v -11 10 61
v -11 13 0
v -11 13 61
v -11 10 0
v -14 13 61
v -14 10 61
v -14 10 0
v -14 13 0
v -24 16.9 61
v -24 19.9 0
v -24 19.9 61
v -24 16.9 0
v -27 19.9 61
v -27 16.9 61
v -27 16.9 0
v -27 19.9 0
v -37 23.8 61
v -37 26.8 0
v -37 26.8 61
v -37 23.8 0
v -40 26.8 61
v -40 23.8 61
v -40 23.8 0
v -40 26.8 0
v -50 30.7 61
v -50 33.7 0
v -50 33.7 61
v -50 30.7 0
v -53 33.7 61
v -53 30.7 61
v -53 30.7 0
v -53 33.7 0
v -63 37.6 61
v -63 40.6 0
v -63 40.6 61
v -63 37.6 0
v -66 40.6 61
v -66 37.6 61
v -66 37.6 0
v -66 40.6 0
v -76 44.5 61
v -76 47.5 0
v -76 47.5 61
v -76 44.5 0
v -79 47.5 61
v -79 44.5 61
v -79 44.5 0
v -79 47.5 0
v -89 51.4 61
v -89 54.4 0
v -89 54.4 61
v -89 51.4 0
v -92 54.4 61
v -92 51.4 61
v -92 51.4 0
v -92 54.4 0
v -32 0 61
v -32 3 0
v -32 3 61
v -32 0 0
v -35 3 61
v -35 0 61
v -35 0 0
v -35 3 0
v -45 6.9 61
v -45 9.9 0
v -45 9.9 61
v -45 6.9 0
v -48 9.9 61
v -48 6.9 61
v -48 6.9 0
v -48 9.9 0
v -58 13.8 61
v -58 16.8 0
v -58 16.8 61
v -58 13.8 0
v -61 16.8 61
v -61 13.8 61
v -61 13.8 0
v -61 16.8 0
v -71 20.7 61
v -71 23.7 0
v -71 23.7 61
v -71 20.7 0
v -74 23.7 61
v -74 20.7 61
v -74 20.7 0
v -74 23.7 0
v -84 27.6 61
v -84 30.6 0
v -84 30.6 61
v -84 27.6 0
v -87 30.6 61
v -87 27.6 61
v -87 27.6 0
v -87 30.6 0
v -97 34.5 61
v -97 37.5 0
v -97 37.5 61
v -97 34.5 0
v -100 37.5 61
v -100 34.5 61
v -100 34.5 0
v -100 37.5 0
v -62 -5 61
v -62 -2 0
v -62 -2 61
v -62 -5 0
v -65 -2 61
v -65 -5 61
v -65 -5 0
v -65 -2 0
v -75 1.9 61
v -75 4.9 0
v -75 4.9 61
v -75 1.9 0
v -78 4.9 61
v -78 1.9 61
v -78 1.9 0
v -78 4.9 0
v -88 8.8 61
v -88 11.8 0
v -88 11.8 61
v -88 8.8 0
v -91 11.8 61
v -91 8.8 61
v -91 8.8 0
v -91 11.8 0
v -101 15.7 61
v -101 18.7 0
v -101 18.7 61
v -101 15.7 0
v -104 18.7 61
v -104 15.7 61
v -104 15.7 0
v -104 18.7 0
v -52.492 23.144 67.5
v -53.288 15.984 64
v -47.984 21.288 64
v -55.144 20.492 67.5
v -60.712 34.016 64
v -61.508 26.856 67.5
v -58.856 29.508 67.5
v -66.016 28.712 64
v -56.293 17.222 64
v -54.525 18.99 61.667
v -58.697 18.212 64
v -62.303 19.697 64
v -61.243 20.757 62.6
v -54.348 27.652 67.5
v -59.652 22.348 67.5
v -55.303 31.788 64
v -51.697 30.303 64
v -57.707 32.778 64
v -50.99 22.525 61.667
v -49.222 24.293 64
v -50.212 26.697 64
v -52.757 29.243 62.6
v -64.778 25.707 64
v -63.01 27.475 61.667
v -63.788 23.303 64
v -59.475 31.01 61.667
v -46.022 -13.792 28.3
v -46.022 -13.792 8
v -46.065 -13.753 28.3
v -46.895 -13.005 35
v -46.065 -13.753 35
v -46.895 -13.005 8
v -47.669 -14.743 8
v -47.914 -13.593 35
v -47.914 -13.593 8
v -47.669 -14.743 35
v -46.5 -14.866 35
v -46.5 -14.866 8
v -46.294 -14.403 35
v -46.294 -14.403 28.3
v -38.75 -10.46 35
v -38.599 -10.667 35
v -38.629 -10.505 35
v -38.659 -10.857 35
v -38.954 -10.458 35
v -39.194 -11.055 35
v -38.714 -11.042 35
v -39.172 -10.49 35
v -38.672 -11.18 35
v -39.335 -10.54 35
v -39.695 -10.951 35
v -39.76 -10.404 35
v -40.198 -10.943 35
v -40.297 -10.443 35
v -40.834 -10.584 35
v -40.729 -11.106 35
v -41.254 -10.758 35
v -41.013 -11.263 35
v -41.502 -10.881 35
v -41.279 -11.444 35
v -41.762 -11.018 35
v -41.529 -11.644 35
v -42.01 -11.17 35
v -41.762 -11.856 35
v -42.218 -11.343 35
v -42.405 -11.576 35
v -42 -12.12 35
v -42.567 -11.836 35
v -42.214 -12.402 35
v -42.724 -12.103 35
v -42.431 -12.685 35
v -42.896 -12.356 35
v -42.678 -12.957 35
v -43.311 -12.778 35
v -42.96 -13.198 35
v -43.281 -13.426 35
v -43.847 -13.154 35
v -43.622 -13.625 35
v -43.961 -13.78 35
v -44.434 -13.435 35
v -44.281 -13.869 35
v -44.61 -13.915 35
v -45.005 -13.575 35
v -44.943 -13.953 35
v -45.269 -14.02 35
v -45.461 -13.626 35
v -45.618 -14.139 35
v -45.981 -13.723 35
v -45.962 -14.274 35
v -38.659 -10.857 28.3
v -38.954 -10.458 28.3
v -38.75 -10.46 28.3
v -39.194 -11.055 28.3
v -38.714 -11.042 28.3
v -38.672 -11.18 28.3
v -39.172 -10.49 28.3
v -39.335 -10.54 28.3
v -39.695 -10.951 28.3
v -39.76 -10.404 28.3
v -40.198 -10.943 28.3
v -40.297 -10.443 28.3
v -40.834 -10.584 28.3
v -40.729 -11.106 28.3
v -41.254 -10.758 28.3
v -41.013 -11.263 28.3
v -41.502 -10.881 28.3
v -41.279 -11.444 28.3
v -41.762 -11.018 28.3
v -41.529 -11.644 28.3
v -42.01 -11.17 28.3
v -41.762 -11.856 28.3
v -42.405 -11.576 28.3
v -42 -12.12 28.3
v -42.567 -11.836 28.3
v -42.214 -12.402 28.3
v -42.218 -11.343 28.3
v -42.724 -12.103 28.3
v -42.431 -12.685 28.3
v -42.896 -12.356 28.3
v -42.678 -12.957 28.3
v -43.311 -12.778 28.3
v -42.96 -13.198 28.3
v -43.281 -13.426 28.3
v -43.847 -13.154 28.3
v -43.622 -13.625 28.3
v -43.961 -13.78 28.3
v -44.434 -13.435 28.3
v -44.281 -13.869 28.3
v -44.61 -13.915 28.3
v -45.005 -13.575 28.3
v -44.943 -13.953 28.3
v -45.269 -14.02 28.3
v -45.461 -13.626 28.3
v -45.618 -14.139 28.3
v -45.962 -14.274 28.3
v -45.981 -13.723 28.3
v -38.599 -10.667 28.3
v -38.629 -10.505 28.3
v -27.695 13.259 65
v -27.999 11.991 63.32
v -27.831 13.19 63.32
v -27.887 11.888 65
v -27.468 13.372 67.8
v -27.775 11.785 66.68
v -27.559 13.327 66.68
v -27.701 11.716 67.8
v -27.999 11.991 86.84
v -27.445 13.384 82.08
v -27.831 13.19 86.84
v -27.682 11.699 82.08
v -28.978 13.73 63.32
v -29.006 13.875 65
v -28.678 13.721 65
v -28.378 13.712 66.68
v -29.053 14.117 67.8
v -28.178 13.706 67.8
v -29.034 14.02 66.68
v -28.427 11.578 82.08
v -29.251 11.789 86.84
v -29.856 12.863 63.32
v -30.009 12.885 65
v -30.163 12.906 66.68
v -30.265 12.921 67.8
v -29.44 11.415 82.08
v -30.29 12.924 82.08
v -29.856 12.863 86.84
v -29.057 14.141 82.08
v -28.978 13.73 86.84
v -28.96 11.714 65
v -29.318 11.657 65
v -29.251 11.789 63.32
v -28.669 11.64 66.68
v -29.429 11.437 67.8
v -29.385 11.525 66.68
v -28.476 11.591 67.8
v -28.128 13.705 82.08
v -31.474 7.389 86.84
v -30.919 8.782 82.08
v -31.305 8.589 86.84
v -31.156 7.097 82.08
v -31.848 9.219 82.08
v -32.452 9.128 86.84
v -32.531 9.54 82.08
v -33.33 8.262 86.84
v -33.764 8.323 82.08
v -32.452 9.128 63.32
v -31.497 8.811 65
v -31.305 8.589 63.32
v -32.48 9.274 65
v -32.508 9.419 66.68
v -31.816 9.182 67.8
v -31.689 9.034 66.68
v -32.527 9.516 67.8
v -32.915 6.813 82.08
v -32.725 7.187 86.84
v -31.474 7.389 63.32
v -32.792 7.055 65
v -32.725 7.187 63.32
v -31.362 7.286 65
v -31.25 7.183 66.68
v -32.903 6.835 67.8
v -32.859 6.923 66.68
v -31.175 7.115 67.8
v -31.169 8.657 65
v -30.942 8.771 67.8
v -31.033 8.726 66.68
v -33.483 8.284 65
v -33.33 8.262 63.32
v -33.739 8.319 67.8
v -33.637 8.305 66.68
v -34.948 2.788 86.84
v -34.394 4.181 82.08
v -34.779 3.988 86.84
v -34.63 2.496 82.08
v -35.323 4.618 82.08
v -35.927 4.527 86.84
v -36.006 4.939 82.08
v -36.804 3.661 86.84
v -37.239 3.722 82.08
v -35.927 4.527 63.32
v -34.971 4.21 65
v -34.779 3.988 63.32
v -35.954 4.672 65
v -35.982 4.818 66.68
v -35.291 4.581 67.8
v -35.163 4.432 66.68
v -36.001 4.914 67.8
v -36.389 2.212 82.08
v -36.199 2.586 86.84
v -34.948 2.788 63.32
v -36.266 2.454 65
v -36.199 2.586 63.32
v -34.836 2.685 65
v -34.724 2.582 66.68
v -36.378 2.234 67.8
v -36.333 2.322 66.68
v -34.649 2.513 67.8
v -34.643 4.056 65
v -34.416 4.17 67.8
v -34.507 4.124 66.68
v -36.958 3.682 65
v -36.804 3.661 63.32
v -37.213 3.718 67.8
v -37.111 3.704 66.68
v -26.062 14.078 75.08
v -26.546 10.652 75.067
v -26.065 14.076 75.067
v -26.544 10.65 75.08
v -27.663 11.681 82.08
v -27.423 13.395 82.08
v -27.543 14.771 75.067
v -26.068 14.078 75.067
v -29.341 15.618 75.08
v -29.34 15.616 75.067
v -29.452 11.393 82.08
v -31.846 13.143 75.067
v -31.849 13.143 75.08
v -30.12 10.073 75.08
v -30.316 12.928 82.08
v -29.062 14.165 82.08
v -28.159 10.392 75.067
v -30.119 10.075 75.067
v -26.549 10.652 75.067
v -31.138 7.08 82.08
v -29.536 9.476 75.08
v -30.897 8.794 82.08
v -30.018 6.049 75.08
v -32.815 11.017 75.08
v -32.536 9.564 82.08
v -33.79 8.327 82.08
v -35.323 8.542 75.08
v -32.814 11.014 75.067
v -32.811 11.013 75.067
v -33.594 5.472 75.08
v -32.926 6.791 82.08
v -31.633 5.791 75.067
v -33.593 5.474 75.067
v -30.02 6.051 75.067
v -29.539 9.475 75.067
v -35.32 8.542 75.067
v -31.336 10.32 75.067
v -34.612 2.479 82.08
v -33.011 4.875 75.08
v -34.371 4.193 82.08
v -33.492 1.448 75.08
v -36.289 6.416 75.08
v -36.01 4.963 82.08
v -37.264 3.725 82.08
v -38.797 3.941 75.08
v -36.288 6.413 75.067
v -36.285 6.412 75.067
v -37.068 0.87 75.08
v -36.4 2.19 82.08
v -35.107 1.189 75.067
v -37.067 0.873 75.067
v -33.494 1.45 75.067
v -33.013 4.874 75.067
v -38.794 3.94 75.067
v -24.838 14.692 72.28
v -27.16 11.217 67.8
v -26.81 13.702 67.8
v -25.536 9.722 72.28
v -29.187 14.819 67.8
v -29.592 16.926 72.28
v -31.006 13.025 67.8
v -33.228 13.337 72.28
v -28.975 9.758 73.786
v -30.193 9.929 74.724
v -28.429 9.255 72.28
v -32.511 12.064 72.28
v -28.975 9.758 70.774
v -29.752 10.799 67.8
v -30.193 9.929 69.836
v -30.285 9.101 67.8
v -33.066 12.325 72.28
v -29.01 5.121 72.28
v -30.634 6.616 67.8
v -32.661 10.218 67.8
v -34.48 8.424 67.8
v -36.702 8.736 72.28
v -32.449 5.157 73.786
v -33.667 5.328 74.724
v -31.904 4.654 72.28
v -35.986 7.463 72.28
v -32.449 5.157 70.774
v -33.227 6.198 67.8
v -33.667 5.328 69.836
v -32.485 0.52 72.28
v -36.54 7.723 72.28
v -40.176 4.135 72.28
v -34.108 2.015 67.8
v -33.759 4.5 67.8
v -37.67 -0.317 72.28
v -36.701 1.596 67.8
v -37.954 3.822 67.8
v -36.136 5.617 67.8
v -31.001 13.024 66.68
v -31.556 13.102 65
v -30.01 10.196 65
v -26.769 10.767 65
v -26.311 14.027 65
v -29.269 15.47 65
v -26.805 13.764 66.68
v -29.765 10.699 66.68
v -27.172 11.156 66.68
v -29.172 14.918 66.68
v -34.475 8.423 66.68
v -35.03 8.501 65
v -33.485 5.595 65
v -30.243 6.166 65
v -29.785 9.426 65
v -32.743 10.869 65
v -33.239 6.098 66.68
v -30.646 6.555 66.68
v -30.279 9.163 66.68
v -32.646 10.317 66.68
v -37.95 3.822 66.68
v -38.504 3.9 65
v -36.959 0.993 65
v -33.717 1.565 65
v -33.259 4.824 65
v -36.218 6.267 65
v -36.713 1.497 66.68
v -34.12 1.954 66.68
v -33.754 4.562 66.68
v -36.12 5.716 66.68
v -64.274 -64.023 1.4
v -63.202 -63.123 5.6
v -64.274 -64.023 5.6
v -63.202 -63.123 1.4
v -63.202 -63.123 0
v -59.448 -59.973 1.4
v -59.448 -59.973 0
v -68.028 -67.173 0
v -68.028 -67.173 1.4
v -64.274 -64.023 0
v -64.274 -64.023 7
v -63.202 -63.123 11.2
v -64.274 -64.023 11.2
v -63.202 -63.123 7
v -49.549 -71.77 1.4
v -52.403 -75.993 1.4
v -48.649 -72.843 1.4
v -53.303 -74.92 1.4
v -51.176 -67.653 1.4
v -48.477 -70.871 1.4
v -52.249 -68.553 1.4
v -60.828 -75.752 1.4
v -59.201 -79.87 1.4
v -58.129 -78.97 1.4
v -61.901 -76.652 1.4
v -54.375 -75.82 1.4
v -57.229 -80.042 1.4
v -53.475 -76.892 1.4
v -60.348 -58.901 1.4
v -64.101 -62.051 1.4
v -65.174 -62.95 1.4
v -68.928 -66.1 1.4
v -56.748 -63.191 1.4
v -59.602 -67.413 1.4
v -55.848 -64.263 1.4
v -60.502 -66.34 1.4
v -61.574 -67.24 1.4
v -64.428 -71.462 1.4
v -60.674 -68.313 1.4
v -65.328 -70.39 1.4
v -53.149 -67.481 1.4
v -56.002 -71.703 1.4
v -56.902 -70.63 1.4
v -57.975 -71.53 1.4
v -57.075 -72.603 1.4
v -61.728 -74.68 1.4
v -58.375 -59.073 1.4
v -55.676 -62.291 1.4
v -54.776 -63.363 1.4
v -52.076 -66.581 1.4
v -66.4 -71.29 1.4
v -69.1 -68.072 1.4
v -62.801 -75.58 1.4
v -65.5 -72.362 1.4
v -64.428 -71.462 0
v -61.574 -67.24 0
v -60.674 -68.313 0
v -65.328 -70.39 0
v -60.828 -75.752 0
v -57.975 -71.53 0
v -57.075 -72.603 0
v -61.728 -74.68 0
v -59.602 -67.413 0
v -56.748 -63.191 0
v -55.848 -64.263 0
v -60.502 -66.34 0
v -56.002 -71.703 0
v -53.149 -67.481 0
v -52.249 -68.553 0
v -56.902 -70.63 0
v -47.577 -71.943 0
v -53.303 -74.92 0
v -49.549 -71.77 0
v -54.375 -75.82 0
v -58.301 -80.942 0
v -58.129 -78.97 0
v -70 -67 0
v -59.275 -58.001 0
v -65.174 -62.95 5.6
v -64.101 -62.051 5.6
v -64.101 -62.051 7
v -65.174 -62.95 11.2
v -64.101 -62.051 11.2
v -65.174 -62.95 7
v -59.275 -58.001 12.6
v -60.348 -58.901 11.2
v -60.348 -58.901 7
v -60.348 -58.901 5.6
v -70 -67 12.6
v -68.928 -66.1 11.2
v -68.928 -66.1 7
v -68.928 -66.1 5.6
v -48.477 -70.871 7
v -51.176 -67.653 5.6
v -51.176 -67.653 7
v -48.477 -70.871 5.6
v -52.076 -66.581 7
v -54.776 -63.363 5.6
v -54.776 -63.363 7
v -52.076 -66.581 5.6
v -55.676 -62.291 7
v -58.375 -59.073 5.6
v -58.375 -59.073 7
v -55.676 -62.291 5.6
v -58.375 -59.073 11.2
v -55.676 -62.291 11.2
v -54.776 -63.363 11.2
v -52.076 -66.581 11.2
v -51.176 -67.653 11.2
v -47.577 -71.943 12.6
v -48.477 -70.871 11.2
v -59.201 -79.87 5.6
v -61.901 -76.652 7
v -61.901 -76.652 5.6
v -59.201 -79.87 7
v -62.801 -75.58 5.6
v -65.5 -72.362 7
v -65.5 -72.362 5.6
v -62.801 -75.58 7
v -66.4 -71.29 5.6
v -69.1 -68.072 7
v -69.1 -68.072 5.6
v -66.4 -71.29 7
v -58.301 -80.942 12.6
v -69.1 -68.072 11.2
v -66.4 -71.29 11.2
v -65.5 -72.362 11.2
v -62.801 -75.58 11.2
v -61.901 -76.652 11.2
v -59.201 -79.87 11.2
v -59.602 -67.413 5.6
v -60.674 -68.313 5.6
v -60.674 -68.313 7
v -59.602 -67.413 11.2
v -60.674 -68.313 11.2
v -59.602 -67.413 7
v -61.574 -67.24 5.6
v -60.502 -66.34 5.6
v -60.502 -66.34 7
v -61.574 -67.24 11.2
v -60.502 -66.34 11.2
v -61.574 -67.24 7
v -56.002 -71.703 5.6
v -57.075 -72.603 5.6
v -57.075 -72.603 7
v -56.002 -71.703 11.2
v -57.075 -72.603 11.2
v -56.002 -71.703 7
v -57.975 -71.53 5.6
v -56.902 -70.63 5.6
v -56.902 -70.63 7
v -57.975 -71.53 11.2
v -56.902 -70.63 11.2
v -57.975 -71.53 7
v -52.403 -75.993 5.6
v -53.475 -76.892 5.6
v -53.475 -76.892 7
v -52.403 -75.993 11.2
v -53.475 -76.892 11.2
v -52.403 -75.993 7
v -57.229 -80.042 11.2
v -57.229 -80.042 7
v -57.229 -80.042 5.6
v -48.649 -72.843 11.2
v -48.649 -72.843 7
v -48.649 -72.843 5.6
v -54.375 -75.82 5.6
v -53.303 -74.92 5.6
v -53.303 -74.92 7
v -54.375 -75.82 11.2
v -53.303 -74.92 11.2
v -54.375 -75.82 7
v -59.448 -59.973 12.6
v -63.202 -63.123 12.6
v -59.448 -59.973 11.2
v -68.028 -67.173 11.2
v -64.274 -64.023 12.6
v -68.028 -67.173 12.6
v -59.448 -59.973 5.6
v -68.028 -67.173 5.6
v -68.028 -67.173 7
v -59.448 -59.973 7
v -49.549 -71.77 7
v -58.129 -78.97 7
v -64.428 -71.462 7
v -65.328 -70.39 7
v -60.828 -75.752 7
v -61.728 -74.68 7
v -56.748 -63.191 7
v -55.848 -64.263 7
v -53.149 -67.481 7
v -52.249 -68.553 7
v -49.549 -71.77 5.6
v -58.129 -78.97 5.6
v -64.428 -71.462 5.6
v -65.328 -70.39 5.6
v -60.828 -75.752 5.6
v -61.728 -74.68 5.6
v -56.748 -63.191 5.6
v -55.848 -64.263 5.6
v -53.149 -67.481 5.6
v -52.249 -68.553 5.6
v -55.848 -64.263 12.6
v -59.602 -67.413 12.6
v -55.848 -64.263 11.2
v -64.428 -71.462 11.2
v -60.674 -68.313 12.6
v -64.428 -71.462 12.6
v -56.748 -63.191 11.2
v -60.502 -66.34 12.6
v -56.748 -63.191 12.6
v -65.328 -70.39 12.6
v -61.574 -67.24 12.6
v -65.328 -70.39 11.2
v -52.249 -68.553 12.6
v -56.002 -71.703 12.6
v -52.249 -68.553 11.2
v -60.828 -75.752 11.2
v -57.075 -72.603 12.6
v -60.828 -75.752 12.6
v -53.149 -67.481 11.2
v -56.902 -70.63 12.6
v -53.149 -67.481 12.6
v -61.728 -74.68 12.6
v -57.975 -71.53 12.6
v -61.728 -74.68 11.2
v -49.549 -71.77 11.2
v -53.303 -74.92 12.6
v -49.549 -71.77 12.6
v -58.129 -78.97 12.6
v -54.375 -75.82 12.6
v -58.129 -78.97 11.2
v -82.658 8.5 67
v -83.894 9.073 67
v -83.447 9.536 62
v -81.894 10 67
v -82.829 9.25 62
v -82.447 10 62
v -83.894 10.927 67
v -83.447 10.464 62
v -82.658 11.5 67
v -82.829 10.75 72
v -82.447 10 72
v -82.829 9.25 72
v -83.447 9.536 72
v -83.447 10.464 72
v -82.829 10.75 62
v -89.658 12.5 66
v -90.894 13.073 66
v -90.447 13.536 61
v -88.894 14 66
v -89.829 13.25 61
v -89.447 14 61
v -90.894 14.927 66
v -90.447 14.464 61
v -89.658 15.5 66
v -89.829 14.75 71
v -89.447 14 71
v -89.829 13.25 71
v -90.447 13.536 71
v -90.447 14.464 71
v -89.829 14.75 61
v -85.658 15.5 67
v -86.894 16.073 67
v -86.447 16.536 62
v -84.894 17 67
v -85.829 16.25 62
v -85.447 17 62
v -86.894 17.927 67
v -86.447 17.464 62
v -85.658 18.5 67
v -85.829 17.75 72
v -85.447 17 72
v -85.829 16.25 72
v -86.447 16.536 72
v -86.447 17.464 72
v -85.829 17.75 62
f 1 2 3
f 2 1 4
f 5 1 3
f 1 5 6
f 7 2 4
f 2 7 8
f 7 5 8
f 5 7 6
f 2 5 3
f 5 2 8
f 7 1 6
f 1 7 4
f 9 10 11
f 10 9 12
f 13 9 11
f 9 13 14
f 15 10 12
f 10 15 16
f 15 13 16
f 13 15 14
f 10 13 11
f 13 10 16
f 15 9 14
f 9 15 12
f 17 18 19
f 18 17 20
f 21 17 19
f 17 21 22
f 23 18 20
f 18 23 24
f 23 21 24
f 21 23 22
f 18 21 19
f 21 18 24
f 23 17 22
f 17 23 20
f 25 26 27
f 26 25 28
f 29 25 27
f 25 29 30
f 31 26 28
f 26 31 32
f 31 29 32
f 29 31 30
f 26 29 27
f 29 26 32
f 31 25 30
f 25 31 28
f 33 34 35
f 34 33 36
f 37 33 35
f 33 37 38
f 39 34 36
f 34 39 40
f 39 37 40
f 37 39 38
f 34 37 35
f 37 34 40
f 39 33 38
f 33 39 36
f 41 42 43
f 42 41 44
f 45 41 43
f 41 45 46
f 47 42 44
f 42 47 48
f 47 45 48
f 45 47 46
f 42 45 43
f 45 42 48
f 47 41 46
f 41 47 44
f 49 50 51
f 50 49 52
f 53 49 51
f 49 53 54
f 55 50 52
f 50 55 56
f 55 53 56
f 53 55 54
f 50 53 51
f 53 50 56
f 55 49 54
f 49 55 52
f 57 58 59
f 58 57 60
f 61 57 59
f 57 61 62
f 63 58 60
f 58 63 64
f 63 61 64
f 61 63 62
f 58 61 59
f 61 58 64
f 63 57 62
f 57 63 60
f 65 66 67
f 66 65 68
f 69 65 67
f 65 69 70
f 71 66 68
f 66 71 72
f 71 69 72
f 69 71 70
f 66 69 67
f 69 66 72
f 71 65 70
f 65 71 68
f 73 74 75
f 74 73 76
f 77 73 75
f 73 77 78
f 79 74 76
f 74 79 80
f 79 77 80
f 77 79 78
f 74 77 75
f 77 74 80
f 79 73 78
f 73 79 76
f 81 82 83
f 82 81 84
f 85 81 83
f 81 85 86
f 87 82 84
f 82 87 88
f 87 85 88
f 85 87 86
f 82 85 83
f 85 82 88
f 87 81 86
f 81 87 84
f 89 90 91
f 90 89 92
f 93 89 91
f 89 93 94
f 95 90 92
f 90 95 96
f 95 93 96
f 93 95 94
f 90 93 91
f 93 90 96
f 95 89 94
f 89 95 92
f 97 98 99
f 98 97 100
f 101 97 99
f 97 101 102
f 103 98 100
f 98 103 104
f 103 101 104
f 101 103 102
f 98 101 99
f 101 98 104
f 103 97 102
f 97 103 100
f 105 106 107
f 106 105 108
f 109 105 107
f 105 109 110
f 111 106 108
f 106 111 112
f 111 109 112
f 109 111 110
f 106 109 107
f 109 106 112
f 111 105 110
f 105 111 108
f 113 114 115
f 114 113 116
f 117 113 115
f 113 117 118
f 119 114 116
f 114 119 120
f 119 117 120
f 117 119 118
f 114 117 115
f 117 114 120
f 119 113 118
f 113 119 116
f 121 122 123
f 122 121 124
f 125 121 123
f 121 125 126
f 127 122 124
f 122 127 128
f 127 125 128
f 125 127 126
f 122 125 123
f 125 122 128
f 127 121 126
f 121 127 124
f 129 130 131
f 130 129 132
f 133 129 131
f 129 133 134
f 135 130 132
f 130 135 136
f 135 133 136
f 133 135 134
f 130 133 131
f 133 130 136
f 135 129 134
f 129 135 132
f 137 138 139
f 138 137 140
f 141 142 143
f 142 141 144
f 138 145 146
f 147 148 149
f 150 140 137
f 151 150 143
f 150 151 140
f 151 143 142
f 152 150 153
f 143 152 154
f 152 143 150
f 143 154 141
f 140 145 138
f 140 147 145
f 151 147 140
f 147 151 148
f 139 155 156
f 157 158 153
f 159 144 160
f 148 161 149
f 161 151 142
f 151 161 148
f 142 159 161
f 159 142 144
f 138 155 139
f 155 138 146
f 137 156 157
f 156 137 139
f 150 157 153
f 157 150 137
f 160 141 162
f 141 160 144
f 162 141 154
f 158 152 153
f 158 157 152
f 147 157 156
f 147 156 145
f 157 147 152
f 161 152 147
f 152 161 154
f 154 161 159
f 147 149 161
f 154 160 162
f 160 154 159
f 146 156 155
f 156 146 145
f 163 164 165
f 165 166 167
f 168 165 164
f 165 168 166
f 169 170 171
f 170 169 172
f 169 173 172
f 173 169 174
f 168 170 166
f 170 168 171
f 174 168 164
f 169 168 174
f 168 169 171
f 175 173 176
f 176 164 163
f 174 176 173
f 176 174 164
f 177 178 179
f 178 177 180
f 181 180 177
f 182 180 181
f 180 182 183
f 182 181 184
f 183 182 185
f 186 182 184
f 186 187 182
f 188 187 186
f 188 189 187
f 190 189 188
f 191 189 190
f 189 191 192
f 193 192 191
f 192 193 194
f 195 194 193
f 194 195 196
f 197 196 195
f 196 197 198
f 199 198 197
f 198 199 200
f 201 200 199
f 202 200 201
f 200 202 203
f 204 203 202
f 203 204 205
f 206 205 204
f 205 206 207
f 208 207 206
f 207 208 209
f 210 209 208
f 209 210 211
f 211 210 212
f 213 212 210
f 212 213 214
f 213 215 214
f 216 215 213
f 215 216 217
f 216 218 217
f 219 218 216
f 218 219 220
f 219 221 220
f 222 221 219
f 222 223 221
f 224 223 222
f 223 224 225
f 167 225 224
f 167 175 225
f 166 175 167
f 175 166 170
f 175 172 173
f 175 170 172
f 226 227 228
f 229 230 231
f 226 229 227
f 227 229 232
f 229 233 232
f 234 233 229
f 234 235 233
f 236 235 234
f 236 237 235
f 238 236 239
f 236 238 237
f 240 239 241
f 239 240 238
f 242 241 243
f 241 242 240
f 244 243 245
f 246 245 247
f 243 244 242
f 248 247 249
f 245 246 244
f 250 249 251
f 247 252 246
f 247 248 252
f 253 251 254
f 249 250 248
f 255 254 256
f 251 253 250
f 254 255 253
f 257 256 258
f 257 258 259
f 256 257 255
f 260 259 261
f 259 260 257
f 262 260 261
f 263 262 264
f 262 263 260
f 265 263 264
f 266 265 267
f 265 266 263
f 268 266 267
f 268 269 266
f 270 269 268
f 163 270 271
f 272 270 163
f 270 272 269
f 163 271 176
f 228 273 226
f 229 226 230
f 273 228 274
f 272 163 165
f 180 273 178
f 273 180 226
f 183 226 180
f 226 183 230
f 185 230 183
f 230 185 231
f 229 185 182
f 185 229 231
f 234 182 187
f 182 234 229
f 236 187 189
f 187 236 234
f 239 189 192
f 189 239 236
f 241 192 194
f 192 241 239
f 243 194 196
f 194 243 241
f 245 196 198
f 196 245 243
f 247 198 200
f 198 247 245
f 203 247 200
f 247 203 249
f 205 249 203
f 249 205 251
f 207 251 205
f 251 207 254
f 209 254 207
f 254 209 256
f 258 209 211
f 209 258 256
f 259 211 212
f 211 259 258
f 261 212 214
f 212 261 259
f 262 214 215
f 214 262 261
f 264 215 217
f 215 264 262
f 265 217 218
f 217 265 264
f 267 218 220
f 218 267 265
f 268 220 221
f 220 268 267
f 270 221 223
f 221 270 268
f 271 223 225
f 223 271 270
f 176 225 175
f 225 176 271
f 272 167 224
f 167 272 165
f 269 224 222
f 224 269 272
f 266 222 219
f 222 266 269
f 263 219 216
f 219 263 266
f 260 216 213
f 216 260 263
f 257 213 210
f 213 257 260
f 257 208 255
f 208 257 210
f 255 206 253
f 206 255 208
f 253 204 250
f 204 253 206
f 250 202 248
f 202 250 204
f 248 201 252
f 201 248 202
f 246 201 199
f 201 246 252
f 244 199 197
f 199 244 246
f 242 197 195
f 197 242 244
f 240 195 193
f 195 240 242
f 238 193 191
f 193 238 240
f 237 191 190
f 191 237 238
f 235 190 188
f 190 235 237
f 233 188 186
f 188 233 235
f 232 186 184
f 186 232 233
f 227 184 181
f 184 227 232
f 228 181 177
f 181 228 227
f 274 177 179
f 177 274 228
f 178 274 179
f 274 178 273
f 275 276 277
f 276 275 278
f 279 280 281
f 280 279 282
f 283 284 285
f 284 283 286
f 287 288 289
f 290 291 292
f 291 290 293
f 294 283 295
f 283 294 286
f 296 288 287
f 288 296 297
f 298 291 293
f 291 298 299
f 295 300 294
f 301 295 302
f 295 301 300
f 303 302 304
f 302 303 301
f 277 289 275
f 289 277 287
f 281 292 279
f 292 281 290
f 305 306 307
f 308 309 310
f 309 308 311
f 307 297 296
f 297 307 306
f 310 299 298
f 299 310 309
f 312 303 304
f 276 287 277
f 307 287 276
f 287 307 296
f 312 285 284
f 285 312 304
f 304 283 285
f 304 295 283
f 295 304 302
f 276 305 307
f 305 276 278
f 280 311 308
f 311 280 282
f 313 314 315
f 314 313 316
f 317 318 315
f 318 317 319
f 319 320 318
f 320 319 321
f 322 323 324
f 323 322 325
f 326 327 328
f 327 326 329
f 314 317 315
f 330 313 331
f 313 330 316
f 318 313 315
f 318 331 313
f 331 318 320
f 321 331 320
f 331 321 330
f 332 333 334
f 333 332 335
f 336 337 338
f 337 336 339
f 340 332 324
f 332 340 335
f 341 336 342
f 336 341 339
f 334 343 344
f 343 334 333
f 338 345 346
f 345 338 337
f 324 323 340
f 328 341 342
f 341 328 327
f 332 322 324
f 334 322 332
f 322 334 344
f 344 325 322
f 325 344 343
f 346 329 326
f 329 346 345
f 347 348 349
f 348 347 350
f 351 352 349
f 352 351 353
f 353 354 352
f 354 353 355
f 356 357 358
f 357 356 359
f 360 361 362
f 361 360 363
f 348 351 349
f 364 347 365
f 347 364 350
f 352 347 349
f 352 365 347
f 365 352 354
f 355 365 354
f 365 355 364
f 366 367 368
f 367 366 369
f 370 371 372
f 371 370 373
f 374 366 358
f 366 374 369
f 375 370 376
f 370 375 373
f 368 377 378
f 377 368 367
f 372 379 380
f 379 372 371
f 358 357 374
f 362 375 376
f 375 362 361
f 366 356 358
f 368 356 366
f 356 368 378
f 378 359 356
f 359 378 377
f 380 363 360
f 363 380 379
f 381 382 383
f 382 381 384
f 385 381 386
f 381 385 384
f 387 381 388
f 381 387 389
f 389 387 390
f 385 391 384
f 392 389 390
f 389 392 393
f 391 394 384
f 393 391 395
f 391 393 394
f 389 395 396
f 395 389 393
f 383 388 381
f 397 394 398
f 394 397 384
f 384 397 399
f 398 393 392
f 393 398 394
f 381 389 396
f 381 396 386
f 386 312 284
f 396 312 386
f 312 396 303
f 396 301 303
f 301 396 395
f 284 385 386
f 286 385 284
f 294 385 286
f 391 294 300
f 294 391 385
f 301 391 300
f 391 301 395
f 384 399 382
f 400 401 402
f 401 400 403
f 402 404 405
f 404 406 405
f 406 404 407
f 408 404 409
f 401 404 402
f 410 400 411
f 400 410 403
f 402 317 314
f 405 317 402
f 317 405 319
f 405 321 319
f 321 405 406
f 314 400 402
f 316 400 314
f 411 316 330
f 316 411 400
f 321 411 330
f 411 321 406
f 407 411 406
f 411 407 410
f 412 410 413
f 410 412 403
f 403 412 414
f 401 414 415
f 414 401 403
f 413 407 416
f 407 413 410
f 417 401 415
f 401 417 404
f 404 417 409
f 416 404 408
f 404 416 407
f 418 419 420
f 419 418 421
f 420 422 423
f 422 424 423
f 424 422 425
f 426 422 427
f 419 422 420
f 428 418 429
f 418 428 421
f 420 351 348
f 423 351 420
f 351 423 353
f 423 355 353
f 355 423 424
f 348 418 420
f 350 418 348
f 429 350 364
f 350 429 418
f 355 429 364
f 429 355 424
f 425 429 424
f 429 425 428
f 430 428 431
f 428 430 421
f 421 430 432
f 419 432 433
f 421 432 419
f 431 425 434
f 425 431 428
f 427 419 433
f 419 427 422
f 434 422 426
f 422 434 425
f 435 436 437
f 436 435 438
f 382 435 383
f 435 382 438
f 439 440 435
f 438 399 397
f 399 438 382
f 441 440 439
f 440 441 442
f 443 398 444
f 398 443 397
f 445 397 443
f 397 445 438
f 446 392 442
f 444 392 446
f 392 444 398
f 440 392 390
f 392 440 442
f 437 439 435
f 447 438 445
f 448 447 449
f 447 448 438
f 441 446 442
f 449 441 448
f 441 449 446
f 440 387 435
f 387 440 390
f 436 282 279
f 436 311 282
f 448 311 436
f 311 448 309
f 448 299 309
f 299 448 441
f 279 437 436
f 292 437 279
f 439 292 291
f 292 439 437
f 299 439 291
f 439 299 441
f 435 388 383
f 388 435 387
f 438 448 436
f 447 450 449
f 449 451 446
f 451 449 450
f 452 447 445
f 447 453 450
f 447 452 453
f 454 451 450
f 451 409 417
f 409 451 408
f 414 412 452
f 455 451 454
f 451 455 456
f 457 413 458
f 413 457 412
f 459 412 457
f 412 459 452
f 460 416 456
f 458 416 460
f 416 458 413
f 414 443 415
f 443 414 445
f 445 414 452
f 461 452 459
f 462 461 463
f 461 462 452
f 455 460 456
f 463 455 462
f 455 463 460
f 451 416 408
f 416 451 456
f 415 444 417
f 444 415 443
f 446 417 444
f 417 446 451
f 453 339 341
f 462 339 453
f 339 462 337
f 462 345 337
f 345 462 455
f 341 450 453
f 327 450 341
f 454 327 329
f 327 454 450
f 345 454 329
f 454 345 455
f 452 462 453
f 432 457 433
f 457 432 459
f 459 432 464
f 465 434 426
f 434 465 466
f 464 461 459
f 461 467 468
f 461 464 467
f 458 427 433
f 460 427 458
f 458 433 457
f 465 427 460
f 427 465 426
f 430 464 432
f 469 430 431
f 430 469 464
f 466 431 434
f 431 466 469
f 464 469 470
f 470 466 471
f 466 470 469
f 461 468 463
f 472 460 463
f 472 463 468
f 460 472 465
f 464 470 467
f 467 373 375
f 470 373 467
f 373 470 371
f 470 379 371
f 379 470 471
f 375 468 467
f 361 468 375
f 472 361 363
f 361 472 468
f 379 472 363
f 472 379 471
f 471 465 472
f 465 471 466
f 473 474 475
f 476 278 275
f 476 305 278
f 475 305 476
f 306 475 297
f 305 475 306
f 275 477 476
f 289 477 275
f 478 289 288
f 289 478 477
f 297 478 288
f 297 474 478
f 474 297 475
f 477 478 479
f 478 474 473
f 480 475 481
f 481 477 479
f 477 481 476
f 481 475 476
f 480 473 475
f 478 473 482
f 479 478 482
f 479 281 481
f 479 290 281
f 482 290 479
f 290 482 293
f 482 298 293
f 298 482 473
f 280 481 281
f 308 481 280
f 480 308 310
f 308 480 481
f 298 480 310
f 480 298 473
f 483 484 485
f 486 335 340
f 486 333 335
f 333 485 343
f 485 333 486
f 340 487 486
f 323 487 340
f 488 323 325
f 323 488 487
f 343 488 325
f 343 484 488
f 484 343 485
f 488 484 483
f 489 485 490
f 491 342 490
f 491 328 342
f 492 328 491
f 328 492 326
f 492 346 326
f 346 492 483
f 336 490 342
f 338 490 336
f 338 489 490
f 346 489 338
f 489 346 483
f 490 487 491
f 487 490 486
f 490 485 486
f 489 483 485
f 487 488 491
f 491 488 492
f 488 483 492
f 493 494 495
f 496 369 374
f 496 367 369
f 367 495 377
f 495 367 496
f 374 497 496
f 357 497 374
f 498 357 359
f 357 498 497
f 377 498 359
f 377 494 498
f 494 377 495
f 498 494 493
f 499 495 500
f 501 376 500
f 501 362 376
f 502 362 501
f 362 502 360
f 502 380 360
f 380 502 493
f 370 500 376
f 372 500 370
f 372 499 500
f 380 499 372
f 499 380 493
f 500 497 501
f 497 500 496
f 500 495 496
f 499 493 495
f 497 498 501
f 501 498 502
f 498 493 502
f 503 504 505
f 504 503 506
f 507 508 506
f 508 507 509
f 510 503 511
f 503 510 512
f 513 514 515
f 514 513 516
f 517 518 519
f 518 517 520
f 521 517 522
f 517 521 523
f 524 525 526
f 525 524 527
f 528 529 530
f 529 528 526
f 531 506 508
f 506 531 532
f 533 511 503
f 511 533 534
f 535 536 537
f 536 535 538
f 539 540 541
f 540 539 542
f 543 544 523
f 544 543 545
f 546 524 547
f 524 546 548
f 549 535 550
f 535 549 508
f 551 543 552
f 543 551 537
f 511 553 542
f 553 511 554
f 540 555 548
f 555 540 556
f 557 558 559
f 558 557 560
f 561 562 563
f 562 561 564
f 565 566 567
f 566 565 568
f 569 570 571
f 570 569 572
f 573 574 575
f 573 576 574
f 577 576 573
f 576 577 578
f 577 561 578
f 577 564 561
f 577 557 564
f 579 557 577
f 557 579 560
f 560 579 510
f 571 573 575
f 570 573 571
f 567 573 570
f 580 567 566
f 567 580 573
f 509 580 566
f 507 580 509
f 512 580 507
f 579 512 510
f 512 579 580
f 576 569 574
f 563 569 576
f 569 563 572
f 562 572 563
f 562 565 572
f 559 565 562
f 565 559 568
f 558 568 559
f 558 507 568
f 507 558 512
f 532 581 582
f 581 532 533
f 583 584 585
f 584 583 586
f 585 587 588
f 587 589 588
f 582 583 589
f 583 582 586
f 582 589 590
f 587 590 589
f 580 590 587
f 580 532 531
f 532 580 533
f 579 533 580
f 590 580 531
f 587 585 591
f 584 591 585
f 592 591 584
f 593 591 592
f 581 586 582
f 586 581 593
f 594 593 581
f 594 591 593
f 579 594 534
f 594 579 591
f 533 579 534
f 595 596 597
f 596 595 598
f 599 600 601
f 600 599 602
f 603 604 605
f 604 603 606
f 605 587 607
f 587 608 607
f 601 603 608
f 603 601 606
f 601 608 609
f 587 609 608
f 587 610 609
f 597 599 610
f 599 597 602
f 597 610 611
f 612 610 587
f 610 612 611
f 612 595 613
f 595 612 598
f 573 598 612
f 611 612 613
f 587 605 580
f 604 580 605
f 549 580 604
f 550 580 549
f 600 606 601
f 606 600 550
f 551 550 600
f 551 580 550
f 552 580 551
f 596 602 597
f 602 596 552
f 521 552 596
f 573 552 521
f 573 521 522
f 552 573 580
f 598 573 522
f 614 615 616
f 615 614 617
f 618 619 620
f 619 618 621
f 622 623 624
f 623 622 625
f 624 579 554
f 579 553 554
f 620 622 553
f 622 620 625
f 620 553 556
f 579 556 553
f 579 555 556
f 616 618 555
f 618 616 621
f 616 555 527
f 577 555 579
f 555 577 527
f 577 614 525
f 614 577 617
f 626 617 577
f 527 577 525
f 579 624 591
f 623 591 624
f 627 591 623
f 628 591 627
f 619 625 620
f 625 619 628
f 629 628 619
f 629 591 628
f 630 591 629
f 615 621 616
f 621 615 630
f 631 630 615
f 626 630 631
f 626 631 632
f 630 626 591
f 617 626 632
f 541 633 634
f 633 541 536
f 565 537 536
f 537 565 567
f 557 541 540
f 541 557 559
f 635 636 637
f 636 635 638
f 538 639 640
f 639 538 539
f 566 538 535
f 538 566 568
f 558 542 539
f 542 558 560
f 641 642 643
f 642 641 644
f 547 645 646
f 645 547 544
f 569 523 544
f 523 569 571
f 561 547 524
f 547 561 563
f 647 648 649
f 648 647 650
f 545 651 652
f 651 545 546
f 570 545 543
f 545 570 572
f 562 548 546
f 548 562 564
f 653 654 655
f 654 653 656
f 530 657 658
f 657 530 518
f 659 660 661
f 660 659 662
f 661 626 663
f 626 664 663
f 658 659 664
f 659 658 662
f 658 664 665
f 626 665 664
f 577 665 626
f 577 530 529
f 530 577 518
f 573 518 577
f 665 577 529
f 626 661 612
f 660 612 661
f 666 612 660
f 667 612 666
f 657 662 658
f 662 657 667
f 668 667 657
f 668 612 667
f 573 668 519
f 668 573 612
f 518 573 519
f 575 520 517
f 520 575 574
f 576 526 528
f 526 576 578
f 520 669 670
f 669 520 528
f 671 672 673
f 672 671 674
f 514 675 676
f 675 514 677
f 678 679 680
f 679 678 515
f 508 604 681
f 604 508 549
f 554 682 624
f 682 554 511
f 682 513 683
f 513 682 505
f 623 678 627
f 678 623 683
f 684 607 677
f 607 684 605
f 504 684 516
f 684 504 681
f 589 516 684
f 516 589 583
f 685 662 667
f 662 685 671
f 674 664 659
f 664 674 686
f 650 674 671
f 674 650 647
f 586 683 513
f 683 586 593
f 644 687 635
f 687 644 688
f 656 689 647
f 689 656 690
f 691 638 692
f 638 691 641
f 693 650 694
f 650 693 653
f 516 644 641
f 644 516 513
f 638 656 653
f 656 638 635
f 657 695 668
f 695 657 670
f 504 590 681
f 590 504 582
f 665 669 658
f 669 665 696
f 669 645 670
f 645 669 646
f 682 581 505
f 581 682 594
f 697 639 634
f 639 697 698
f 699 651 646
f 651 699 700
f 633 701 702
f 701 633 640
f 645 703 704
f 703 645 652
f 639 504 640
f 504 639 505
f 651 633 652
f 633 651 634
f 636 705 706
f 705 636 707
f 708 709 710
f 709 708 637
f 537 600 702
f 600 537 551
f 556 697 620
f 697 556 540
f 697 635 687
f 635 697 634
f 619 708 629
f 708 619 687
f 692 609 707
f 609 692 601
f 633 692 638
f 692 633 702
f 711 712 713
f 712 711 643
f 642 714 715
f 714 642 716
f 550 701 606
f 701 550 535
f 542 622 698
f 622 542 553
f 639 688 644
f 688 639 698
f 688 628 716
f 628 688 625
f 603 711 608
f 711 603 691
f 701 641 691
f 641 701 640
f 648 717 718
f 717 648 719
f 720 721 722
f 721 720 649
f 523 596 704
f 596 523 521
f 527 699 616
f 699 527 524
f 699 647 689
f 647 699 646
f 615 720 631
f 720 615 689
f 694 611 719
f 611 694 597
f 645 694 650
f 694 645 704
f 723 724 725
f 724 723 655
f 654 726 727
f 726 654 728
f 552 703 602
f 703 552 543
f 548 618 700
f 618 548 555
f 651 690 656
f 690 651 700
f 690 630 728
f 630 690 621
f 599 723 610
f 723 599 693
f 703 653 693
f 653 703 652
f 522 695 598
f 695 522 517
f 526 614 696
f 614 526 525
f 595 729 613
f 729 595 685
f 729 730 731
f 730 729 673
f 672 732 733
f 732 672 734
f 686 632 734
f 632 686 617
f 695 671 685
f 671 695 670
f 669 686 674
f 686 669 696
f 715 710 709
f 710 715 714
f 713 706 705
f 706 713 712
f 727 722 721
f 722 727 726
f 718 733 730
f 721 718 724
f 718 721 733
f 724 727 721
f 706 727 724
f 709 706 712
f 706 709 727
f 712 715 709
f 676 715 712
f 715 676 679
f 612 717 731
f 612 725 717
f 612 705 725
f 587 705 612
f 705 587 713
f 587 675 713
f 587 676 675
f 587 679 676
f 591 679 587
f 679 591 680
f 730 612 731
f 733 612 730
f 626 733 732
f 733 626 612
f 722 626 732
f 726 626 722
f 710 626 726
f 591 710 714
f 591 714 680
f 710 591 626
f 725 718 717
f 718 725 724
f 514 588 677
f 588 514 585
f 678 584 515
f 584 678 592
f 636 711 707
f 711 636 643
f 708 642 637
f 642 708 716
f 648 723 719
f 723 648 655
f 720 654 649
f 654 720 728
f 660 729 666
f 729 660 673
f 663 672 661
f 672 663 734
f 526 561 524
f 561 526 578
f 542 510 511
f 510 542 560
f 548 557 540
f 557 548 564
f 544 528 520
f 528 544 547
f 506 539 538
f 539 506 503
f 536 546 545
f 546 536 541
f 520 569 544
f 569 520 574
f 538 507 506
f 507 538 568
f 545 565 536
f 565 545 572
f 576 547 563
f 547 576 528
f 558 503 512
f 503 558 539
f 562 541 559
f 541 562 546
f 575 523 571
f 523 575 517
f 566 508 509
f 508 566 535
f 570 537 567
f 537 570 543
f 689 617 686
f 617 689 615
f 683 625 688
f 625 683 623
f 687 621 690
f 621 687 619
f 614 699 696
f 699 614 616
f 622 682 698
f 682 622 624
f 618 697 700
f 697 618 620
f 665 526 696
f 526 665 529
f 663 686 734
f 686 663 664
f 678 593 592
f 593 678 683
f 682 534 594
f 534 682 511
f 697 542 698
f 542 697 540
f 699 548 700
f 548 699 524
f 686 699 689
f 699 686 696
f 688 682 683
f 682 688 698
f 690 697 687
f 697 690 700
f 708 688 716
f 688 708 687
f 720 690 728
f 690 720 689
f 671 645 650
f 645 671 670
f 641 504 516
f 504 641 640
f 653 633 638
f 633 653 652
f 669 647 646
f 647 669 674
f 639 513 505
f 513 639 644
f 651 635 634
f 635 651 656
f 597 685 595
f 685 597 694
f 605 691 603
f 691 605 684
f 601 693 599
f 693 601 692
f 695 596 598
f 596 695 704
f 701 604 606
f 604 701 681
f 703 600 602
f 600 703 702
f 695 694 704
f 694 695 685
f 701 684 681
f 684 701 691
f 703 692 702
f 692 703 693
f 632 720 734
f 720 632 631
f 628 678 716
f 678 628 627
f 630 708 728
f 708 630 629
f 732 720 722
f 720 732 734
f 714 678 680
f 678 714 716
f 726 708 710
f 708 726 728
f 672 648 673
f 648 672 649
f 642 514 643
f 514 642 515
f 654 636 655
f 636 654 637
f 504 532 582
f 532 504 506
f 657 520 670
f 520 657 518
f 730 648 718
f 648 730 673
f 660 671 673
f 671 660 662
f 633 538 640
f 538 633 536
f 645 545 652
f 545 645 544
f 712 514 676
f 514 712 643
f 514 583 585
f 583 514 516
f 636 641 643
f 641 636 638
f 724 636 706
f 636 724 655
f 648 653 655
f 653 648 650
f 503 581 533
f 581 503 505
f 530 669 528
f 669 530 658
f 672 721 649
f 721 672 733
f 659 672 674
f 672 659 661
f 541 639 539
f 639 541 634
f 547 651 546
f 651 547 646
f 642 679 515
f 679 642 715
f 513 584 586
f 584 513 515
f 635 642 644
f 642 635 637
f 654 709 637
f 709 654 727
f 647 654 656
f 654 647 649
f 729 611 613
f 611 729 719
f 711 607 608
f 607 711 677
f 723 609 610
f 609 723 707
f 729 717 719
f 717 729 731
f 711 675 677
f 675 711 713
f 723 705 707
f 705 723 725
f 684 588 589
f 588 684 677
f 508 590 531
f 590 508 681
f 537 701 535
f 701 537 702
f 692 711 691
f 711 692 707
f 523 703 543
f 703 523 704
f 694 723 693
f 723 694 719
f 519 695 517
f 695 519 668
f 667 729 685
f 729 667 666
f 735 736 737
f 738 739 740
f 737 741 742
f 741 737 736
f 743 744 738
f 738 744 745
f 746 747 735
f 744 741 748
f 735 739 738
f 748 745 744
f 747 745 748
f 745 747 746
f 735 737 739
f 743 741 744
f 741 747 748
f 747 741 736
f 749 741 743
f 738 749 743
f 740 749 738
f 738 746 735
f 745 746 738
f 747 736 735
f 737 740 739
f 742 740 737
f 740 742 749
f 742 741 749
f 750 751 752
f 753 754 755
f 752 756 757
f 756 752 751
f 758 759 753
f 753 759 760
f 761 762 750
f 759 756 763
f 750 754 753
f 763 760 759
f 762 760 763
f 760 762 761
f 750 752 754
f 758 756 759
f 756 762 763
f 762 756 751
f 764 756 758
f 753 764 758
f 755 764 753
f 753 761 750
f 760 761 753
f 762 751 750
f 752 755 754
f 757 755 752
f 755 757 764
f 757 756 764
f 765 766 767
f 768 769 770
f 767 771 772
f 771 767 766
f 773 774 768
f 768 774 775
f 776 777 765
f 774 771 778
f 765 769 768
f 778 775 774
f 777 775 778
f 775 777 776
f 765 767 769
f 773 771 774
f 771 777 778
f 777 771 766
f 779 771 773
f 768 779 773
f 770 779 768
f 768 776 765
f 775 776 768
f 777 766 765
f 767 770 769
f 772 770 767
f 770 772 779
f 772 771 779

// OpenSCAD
$fn=6;
for (i=[0:6]){
translate([-14-13*i,10+6.9*i,0])stick();}

$fn=5;
for (i=[0:5]){
translate([-35-13*i,0+6.9*i,0])stick();}

$fn=5;
for (i=[0:3]){
translate([-65-13*i,-5+6.9*i,0])stick();}


module stick(){
cube([3,3,61]);}
translate([-5,15,60])rotate([0,0,240])deck();

rotate([0,0,290])slope(50, 40, 20);
rotate([0,0,325])slope(20, 70, 40);
slope(3, 150, 40);


module slope(x,y,z)
{linear_extrude(height = x,convexity= y, twist= z, center = false) {

polygon(points=[[0.35,-0.44],[3.14,-0.18],[6.01,0],[8.83,-0.14],[11.46,-0.78],[15,-3.29],[17.52,-6.99],[19.6,-11.12],[21.85,-14.94],[25.59,-20.12],[29.56,-26.11],[33.12,-32.39],[35.63,-38.44],[37.49,-44.42],[39.01,-50.38],[39.65,-56.38],[38.89,-62.49],[37.97,-65.7],[36.96,-69.01],[36.01,-72.26],[35.25,-75.32],[34.68,-78.59],[34.17,-81.77],[33.36,-84.87],[31.92,-87.93],[28.97,-92],[25.1,-96.15],[20.79,-99.8],[16.48,-102.32],[13.96,-103.37],[11.2,-104.35],[8.38,-104.95],[5.66,-104.86],[3.54,-104.07],[2.52,-102.89],[2.71,-101.43],[4.23,-99.83],[5.56,-99.12],[6.92,-98.68],[8.25,-98.12],[9.53,-97.08],[10.88,-95.14],[12,-92.87],[12.96,-90.5],[13.84,-88.26],[14.88,-85.41],[15.75,-82.54],[16.59,-79.67],[17.56,-76.82],[18.2,-75.4],[18.92,-74.05],[19.64,-72.72],[20.28,-71.36],[20.98,-68.9],[21.22,-66.34],[21.22,-63.7],[21.17,-60.99],[21.31,-56.49],[21.51,-51.68],[21.44,-46.9],[20.76,-42.47],[19.4,-38.14],[17.87,-33.95],[16.46,-29.7],[15.45,-25.23],[14.86,-22.13],[14.08,-19.08],[13.21,-16.05],[12.35,-13.03],[12,-11.36],[11.53,-9.06],[10.93,-6.85],[10.18,-5.48],[8.93,-4.97],[7.24,-4.87],[5.46,-4.95],[3.94,-4.97],[3.71,-3.6],[3.49,-2.25],[3.04,-1.05],[2.12,-0.09]]);}}


module deck() {linear_extrude(height = 5, center = false) {

polygon(points=[[3.18,-1.76],[3.53,-17.05],[1.1,-32.32],[1.31,-43.96],[3.2,-55.42],[3.83,-62.86],[3.94,-70.36],[4.58,-78.91],[4.94,-87.49],[4.26,-91.98],[3.86,-96.24],[10.62,-100.52],[19.68,-102.28],[39.33,-97.38],[55.11,-83.62],[59.24,-71.15],[59.3,-57.57],[55.48,-46.53],[48.36,-37.16],[40.82,-22.85],[30.36,-11.68],[20.97,-7.96],[11.76,-4.14],[7.23,-2.14],[3.18,-3.88]]);

}
}

module mound(){$fn=6;
difference(){resize(newsize=[15,18,7])sphere(5);translate([0,0,-2.5])cube([12,12,5],center=true);}}

translate([-57,25,64])rotate([0,0,45])mound();


module total(){
module rockbase() {linear_extrude(height = 5, center = true) {

polygon(points=[[11.85,-11.09],[17.11,-8.04],[22.08,-3.69],[26.87,-1.77],[31.95,-0.85],[38.35,-0.08],[44.31,-0.8],[46.07,-10.52],[45.37,-21.26],[45.28,-41.1],[35.5,-56.95],[29.54,-58.55],[23.29,-58.71],[18.62,-57.61],[16.22,-53.71],[13,-50.41],[9.52,-47.71],[5.66,-41.51],[2.21,-34.83],[0.19,-26.35],[5.03,-19.07],[8.19,-16.67],[11.25,-14.36],[13.51,-11.21],[16.08,-8.27]]);

}}

module big(){for (i=[0:30])
translate([0-2*i,0+2.5*i,2*i/3])scale(.07*i, .04*i, .1*i) rockbase();}

difference(){big();translate([50,34,0])rotate([0,0,35])cube([50,30,15]);}

module little(){for (i=[0:7])
translate([100+0-2*i,100+0+2.5*i,2.3*i])scale(.5+.07*i, .5+.04*i, .5+.1*i) rockbase();}
translate([165,40,6.75])rotate([0,0,165])little();}

scale(.6,.4,.5)translate([-90,-27,25])rotate([180,0,130])total();

module flag(){cylinder(27,1,1);

scale(.1,.1,.1)linear_extrude(height = 67, center = false) {

polygon(points=[[2.76,0],[3.57,-0.23],[4.44,-0.38],[5.34,-0.44],[6.23,-0.41],[7,-3.98],[7.56,-7.62],[8.11,-11.27],[8.83,-14.89],[9.88,-18.05],[11.21,-21.12],[12.46,-24.2],[13.29,-27.42],[13.64,-31.13],[13.62,-35.08],[13.26,-39],[12.58,-42.64],[11.46,-46.14],[10.09,-49.44],[8.72,-52.7],[7.62,-56.08],[6.95,-59.16],[6.47,-62.32],[6.23,-65.53],[6.29,-68.78],[7.53,-74.19],[10.12,-78.51],[13.53,-82.33],[17.22,-86.22],[15.81,-86.55],[14.49,-87.95],[13.14,-89.42],[11.59,-89.97],[10.59,-89.15],[9.56,-87.39],[8.74,-85.34],[8.36,-83.68],[5.06,-80.68],[2.71,-75.83],[1.25,-70.48],[0.65,-65.97],[0.48,-63.21],[0.36,-60.27],[0.44,-57.37],[0.9,-54.7],[1.98,-51.91],[3.42,-49.21],[4.95,-46.52],[6.28,-43.76],[7.86,-38.06],[8.44,-31.54],[7.94,-25.05],[6.29,-19.4],[4.46,-15.2],[2.7,-10.21],[1.77,-5.14],[2.41,-0.71]]);

}}

translate([-47,-14,35])rotate([180,0,300])flag();

module grass(x,y,z) {translate([x,y,z])resize(newsize=[2,3,10])sphere(4);}

grass(-83,10,67);
grass(-90,14,66);
grass(-86,17,67);

module trees(){module grass(){for ( i = [0 : 2] )
{translate([5*i,9*i,18])resize(newsize=[7,7,42])sphere(4);}}

rotate([0,0,222])translate([-111,30,0])grass();

module grass2(){for ( i = [0 : 2] )
{translate([5*i,9*i,18])resize(newsize=[10,10,25])sphere(4);}}

rotate([0,0,222])translate([-111,30,0])grass2();

module grass4(){for ( i = [0 : 2] )
{translate([5*i,9*i,13])resize(newsize=[14.5,14.5,16])sphere(4);}}

rotate([0,0,222])translate([-111,30,0])grass4();

module grass3(){for ( i = [0 : 2] )
{translate([5*i,9*i,0])cylinder(3,5,4);}}

rotate([0,0,222])translate([-111,30,0])grass3();}

translate([-88,38,65])scale(.56,.56,.79)rotate([0,0,310])trees();

module grid() {for (i=[0:3]){ translate([4*i,0,0])cube([1,10,1]);}

for (i=[0:3]){ translate([4*i,0,4])cube([1,10,1]);}
for (i=[0:3]){ translate([4*i,0,8])cube([1,10,1]);}

for (i=[0:2]) {translate([0,4.5*i,0])cube([12,1,1]);}


for (i=[0:2]) {translate([0,4.5*i,4])cube([12,1,1]);}


for (i=[0:2]) {translate([0,4.5*i,8])cube([12,1,1]);}

for (i=[0:3]) {translate([4*i,0,0])cube([1,1,9]);}

for (i=[0:3]) {translate([4*i,4.5,0])cube([1,1,9]);}

for (i=[0:3]) {translate([4*i,9,0])cube([1,1,9]);}}

translate([-70,-67,0])scale(1.4, 1.6, 1.3)rotate([0,0,310])grid();
